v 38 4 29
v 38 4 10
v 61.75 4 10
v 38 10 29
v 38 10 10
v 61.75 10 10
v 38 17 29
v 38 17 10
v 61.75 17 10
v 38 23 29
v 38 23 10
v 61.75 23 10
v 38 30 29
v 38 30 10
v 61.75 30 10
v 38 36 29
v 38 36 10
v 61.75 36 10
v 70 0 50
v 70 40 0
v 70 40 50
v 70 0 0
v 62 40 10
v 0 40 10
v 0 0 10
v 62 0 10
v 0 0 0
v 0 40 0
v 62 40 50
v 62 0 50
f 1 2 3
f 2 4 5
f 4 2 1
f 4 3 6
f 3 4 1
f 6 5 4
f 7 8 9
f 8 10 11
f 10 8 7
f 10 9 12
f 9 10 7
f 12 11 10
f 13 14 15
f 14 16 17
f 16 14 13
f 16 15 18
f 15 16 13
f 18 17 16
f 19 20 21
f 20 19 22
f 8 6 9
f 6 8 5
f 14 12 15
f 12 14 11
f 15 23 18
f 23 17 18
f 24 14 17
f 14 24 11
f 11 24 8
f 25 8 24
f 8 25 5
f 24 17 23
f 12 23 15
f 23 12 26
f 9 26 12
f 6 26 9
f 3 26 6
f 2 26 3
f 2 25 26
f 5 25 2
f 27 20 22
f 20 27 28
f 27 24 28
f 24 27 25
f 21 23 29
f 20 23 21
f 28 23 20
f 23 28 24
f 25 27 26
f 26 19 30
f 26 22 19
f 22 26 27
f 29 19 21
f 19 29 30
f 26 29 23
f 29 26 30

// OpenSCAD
$fn = 32;

// ----------------------------------------------------------------------
// Rib bracket: 3-gusset L bracket
// ----------------------------------------------------------------------

// --- parameters (mm) ---
base_l = 70;              // foot length, X
base_w = 40;              // foot width, Y
base_t = 10;              // foot thickness
plate_t = 8;              // upright plate thickness
plate_h = 50;             // overall height
gus_l = 24;               // gusset leg along the foot
gus_h = 20;               // gusset height
gus_t = 6;                // gusset thickness
gus_edge = 4;             // gusset margin from the foot edge
n_gus = 3;                // gusset count
fit_tol = 0.1;            // tolerance for press fits, mm
free_tol = 0.5;           // tolerance for clearance fits, mm

gus_pitch = (base_w - 2 * gus_edge - gus_t) / (n_gus - 1);  // gusset pitch

union() {
  cube([base_l, base_w, base_t]);
  translate([base_l - plate_t, 0, base_t - 1])
    cube([plate_t, base_w, plate_h - base_t + 1]);
  for (i = [0 : n_gus - 1])
    translate([base_l - plate_t - gus_l, gus_edge + i * gus_pitch, base_t - 1])
      rotate([-90, 0, 0])
        linear_extrude(height = gus_t)
          polygon(points = [[0, 0], [gus_l + 1, 0], [0, -gus_h]]);
}
